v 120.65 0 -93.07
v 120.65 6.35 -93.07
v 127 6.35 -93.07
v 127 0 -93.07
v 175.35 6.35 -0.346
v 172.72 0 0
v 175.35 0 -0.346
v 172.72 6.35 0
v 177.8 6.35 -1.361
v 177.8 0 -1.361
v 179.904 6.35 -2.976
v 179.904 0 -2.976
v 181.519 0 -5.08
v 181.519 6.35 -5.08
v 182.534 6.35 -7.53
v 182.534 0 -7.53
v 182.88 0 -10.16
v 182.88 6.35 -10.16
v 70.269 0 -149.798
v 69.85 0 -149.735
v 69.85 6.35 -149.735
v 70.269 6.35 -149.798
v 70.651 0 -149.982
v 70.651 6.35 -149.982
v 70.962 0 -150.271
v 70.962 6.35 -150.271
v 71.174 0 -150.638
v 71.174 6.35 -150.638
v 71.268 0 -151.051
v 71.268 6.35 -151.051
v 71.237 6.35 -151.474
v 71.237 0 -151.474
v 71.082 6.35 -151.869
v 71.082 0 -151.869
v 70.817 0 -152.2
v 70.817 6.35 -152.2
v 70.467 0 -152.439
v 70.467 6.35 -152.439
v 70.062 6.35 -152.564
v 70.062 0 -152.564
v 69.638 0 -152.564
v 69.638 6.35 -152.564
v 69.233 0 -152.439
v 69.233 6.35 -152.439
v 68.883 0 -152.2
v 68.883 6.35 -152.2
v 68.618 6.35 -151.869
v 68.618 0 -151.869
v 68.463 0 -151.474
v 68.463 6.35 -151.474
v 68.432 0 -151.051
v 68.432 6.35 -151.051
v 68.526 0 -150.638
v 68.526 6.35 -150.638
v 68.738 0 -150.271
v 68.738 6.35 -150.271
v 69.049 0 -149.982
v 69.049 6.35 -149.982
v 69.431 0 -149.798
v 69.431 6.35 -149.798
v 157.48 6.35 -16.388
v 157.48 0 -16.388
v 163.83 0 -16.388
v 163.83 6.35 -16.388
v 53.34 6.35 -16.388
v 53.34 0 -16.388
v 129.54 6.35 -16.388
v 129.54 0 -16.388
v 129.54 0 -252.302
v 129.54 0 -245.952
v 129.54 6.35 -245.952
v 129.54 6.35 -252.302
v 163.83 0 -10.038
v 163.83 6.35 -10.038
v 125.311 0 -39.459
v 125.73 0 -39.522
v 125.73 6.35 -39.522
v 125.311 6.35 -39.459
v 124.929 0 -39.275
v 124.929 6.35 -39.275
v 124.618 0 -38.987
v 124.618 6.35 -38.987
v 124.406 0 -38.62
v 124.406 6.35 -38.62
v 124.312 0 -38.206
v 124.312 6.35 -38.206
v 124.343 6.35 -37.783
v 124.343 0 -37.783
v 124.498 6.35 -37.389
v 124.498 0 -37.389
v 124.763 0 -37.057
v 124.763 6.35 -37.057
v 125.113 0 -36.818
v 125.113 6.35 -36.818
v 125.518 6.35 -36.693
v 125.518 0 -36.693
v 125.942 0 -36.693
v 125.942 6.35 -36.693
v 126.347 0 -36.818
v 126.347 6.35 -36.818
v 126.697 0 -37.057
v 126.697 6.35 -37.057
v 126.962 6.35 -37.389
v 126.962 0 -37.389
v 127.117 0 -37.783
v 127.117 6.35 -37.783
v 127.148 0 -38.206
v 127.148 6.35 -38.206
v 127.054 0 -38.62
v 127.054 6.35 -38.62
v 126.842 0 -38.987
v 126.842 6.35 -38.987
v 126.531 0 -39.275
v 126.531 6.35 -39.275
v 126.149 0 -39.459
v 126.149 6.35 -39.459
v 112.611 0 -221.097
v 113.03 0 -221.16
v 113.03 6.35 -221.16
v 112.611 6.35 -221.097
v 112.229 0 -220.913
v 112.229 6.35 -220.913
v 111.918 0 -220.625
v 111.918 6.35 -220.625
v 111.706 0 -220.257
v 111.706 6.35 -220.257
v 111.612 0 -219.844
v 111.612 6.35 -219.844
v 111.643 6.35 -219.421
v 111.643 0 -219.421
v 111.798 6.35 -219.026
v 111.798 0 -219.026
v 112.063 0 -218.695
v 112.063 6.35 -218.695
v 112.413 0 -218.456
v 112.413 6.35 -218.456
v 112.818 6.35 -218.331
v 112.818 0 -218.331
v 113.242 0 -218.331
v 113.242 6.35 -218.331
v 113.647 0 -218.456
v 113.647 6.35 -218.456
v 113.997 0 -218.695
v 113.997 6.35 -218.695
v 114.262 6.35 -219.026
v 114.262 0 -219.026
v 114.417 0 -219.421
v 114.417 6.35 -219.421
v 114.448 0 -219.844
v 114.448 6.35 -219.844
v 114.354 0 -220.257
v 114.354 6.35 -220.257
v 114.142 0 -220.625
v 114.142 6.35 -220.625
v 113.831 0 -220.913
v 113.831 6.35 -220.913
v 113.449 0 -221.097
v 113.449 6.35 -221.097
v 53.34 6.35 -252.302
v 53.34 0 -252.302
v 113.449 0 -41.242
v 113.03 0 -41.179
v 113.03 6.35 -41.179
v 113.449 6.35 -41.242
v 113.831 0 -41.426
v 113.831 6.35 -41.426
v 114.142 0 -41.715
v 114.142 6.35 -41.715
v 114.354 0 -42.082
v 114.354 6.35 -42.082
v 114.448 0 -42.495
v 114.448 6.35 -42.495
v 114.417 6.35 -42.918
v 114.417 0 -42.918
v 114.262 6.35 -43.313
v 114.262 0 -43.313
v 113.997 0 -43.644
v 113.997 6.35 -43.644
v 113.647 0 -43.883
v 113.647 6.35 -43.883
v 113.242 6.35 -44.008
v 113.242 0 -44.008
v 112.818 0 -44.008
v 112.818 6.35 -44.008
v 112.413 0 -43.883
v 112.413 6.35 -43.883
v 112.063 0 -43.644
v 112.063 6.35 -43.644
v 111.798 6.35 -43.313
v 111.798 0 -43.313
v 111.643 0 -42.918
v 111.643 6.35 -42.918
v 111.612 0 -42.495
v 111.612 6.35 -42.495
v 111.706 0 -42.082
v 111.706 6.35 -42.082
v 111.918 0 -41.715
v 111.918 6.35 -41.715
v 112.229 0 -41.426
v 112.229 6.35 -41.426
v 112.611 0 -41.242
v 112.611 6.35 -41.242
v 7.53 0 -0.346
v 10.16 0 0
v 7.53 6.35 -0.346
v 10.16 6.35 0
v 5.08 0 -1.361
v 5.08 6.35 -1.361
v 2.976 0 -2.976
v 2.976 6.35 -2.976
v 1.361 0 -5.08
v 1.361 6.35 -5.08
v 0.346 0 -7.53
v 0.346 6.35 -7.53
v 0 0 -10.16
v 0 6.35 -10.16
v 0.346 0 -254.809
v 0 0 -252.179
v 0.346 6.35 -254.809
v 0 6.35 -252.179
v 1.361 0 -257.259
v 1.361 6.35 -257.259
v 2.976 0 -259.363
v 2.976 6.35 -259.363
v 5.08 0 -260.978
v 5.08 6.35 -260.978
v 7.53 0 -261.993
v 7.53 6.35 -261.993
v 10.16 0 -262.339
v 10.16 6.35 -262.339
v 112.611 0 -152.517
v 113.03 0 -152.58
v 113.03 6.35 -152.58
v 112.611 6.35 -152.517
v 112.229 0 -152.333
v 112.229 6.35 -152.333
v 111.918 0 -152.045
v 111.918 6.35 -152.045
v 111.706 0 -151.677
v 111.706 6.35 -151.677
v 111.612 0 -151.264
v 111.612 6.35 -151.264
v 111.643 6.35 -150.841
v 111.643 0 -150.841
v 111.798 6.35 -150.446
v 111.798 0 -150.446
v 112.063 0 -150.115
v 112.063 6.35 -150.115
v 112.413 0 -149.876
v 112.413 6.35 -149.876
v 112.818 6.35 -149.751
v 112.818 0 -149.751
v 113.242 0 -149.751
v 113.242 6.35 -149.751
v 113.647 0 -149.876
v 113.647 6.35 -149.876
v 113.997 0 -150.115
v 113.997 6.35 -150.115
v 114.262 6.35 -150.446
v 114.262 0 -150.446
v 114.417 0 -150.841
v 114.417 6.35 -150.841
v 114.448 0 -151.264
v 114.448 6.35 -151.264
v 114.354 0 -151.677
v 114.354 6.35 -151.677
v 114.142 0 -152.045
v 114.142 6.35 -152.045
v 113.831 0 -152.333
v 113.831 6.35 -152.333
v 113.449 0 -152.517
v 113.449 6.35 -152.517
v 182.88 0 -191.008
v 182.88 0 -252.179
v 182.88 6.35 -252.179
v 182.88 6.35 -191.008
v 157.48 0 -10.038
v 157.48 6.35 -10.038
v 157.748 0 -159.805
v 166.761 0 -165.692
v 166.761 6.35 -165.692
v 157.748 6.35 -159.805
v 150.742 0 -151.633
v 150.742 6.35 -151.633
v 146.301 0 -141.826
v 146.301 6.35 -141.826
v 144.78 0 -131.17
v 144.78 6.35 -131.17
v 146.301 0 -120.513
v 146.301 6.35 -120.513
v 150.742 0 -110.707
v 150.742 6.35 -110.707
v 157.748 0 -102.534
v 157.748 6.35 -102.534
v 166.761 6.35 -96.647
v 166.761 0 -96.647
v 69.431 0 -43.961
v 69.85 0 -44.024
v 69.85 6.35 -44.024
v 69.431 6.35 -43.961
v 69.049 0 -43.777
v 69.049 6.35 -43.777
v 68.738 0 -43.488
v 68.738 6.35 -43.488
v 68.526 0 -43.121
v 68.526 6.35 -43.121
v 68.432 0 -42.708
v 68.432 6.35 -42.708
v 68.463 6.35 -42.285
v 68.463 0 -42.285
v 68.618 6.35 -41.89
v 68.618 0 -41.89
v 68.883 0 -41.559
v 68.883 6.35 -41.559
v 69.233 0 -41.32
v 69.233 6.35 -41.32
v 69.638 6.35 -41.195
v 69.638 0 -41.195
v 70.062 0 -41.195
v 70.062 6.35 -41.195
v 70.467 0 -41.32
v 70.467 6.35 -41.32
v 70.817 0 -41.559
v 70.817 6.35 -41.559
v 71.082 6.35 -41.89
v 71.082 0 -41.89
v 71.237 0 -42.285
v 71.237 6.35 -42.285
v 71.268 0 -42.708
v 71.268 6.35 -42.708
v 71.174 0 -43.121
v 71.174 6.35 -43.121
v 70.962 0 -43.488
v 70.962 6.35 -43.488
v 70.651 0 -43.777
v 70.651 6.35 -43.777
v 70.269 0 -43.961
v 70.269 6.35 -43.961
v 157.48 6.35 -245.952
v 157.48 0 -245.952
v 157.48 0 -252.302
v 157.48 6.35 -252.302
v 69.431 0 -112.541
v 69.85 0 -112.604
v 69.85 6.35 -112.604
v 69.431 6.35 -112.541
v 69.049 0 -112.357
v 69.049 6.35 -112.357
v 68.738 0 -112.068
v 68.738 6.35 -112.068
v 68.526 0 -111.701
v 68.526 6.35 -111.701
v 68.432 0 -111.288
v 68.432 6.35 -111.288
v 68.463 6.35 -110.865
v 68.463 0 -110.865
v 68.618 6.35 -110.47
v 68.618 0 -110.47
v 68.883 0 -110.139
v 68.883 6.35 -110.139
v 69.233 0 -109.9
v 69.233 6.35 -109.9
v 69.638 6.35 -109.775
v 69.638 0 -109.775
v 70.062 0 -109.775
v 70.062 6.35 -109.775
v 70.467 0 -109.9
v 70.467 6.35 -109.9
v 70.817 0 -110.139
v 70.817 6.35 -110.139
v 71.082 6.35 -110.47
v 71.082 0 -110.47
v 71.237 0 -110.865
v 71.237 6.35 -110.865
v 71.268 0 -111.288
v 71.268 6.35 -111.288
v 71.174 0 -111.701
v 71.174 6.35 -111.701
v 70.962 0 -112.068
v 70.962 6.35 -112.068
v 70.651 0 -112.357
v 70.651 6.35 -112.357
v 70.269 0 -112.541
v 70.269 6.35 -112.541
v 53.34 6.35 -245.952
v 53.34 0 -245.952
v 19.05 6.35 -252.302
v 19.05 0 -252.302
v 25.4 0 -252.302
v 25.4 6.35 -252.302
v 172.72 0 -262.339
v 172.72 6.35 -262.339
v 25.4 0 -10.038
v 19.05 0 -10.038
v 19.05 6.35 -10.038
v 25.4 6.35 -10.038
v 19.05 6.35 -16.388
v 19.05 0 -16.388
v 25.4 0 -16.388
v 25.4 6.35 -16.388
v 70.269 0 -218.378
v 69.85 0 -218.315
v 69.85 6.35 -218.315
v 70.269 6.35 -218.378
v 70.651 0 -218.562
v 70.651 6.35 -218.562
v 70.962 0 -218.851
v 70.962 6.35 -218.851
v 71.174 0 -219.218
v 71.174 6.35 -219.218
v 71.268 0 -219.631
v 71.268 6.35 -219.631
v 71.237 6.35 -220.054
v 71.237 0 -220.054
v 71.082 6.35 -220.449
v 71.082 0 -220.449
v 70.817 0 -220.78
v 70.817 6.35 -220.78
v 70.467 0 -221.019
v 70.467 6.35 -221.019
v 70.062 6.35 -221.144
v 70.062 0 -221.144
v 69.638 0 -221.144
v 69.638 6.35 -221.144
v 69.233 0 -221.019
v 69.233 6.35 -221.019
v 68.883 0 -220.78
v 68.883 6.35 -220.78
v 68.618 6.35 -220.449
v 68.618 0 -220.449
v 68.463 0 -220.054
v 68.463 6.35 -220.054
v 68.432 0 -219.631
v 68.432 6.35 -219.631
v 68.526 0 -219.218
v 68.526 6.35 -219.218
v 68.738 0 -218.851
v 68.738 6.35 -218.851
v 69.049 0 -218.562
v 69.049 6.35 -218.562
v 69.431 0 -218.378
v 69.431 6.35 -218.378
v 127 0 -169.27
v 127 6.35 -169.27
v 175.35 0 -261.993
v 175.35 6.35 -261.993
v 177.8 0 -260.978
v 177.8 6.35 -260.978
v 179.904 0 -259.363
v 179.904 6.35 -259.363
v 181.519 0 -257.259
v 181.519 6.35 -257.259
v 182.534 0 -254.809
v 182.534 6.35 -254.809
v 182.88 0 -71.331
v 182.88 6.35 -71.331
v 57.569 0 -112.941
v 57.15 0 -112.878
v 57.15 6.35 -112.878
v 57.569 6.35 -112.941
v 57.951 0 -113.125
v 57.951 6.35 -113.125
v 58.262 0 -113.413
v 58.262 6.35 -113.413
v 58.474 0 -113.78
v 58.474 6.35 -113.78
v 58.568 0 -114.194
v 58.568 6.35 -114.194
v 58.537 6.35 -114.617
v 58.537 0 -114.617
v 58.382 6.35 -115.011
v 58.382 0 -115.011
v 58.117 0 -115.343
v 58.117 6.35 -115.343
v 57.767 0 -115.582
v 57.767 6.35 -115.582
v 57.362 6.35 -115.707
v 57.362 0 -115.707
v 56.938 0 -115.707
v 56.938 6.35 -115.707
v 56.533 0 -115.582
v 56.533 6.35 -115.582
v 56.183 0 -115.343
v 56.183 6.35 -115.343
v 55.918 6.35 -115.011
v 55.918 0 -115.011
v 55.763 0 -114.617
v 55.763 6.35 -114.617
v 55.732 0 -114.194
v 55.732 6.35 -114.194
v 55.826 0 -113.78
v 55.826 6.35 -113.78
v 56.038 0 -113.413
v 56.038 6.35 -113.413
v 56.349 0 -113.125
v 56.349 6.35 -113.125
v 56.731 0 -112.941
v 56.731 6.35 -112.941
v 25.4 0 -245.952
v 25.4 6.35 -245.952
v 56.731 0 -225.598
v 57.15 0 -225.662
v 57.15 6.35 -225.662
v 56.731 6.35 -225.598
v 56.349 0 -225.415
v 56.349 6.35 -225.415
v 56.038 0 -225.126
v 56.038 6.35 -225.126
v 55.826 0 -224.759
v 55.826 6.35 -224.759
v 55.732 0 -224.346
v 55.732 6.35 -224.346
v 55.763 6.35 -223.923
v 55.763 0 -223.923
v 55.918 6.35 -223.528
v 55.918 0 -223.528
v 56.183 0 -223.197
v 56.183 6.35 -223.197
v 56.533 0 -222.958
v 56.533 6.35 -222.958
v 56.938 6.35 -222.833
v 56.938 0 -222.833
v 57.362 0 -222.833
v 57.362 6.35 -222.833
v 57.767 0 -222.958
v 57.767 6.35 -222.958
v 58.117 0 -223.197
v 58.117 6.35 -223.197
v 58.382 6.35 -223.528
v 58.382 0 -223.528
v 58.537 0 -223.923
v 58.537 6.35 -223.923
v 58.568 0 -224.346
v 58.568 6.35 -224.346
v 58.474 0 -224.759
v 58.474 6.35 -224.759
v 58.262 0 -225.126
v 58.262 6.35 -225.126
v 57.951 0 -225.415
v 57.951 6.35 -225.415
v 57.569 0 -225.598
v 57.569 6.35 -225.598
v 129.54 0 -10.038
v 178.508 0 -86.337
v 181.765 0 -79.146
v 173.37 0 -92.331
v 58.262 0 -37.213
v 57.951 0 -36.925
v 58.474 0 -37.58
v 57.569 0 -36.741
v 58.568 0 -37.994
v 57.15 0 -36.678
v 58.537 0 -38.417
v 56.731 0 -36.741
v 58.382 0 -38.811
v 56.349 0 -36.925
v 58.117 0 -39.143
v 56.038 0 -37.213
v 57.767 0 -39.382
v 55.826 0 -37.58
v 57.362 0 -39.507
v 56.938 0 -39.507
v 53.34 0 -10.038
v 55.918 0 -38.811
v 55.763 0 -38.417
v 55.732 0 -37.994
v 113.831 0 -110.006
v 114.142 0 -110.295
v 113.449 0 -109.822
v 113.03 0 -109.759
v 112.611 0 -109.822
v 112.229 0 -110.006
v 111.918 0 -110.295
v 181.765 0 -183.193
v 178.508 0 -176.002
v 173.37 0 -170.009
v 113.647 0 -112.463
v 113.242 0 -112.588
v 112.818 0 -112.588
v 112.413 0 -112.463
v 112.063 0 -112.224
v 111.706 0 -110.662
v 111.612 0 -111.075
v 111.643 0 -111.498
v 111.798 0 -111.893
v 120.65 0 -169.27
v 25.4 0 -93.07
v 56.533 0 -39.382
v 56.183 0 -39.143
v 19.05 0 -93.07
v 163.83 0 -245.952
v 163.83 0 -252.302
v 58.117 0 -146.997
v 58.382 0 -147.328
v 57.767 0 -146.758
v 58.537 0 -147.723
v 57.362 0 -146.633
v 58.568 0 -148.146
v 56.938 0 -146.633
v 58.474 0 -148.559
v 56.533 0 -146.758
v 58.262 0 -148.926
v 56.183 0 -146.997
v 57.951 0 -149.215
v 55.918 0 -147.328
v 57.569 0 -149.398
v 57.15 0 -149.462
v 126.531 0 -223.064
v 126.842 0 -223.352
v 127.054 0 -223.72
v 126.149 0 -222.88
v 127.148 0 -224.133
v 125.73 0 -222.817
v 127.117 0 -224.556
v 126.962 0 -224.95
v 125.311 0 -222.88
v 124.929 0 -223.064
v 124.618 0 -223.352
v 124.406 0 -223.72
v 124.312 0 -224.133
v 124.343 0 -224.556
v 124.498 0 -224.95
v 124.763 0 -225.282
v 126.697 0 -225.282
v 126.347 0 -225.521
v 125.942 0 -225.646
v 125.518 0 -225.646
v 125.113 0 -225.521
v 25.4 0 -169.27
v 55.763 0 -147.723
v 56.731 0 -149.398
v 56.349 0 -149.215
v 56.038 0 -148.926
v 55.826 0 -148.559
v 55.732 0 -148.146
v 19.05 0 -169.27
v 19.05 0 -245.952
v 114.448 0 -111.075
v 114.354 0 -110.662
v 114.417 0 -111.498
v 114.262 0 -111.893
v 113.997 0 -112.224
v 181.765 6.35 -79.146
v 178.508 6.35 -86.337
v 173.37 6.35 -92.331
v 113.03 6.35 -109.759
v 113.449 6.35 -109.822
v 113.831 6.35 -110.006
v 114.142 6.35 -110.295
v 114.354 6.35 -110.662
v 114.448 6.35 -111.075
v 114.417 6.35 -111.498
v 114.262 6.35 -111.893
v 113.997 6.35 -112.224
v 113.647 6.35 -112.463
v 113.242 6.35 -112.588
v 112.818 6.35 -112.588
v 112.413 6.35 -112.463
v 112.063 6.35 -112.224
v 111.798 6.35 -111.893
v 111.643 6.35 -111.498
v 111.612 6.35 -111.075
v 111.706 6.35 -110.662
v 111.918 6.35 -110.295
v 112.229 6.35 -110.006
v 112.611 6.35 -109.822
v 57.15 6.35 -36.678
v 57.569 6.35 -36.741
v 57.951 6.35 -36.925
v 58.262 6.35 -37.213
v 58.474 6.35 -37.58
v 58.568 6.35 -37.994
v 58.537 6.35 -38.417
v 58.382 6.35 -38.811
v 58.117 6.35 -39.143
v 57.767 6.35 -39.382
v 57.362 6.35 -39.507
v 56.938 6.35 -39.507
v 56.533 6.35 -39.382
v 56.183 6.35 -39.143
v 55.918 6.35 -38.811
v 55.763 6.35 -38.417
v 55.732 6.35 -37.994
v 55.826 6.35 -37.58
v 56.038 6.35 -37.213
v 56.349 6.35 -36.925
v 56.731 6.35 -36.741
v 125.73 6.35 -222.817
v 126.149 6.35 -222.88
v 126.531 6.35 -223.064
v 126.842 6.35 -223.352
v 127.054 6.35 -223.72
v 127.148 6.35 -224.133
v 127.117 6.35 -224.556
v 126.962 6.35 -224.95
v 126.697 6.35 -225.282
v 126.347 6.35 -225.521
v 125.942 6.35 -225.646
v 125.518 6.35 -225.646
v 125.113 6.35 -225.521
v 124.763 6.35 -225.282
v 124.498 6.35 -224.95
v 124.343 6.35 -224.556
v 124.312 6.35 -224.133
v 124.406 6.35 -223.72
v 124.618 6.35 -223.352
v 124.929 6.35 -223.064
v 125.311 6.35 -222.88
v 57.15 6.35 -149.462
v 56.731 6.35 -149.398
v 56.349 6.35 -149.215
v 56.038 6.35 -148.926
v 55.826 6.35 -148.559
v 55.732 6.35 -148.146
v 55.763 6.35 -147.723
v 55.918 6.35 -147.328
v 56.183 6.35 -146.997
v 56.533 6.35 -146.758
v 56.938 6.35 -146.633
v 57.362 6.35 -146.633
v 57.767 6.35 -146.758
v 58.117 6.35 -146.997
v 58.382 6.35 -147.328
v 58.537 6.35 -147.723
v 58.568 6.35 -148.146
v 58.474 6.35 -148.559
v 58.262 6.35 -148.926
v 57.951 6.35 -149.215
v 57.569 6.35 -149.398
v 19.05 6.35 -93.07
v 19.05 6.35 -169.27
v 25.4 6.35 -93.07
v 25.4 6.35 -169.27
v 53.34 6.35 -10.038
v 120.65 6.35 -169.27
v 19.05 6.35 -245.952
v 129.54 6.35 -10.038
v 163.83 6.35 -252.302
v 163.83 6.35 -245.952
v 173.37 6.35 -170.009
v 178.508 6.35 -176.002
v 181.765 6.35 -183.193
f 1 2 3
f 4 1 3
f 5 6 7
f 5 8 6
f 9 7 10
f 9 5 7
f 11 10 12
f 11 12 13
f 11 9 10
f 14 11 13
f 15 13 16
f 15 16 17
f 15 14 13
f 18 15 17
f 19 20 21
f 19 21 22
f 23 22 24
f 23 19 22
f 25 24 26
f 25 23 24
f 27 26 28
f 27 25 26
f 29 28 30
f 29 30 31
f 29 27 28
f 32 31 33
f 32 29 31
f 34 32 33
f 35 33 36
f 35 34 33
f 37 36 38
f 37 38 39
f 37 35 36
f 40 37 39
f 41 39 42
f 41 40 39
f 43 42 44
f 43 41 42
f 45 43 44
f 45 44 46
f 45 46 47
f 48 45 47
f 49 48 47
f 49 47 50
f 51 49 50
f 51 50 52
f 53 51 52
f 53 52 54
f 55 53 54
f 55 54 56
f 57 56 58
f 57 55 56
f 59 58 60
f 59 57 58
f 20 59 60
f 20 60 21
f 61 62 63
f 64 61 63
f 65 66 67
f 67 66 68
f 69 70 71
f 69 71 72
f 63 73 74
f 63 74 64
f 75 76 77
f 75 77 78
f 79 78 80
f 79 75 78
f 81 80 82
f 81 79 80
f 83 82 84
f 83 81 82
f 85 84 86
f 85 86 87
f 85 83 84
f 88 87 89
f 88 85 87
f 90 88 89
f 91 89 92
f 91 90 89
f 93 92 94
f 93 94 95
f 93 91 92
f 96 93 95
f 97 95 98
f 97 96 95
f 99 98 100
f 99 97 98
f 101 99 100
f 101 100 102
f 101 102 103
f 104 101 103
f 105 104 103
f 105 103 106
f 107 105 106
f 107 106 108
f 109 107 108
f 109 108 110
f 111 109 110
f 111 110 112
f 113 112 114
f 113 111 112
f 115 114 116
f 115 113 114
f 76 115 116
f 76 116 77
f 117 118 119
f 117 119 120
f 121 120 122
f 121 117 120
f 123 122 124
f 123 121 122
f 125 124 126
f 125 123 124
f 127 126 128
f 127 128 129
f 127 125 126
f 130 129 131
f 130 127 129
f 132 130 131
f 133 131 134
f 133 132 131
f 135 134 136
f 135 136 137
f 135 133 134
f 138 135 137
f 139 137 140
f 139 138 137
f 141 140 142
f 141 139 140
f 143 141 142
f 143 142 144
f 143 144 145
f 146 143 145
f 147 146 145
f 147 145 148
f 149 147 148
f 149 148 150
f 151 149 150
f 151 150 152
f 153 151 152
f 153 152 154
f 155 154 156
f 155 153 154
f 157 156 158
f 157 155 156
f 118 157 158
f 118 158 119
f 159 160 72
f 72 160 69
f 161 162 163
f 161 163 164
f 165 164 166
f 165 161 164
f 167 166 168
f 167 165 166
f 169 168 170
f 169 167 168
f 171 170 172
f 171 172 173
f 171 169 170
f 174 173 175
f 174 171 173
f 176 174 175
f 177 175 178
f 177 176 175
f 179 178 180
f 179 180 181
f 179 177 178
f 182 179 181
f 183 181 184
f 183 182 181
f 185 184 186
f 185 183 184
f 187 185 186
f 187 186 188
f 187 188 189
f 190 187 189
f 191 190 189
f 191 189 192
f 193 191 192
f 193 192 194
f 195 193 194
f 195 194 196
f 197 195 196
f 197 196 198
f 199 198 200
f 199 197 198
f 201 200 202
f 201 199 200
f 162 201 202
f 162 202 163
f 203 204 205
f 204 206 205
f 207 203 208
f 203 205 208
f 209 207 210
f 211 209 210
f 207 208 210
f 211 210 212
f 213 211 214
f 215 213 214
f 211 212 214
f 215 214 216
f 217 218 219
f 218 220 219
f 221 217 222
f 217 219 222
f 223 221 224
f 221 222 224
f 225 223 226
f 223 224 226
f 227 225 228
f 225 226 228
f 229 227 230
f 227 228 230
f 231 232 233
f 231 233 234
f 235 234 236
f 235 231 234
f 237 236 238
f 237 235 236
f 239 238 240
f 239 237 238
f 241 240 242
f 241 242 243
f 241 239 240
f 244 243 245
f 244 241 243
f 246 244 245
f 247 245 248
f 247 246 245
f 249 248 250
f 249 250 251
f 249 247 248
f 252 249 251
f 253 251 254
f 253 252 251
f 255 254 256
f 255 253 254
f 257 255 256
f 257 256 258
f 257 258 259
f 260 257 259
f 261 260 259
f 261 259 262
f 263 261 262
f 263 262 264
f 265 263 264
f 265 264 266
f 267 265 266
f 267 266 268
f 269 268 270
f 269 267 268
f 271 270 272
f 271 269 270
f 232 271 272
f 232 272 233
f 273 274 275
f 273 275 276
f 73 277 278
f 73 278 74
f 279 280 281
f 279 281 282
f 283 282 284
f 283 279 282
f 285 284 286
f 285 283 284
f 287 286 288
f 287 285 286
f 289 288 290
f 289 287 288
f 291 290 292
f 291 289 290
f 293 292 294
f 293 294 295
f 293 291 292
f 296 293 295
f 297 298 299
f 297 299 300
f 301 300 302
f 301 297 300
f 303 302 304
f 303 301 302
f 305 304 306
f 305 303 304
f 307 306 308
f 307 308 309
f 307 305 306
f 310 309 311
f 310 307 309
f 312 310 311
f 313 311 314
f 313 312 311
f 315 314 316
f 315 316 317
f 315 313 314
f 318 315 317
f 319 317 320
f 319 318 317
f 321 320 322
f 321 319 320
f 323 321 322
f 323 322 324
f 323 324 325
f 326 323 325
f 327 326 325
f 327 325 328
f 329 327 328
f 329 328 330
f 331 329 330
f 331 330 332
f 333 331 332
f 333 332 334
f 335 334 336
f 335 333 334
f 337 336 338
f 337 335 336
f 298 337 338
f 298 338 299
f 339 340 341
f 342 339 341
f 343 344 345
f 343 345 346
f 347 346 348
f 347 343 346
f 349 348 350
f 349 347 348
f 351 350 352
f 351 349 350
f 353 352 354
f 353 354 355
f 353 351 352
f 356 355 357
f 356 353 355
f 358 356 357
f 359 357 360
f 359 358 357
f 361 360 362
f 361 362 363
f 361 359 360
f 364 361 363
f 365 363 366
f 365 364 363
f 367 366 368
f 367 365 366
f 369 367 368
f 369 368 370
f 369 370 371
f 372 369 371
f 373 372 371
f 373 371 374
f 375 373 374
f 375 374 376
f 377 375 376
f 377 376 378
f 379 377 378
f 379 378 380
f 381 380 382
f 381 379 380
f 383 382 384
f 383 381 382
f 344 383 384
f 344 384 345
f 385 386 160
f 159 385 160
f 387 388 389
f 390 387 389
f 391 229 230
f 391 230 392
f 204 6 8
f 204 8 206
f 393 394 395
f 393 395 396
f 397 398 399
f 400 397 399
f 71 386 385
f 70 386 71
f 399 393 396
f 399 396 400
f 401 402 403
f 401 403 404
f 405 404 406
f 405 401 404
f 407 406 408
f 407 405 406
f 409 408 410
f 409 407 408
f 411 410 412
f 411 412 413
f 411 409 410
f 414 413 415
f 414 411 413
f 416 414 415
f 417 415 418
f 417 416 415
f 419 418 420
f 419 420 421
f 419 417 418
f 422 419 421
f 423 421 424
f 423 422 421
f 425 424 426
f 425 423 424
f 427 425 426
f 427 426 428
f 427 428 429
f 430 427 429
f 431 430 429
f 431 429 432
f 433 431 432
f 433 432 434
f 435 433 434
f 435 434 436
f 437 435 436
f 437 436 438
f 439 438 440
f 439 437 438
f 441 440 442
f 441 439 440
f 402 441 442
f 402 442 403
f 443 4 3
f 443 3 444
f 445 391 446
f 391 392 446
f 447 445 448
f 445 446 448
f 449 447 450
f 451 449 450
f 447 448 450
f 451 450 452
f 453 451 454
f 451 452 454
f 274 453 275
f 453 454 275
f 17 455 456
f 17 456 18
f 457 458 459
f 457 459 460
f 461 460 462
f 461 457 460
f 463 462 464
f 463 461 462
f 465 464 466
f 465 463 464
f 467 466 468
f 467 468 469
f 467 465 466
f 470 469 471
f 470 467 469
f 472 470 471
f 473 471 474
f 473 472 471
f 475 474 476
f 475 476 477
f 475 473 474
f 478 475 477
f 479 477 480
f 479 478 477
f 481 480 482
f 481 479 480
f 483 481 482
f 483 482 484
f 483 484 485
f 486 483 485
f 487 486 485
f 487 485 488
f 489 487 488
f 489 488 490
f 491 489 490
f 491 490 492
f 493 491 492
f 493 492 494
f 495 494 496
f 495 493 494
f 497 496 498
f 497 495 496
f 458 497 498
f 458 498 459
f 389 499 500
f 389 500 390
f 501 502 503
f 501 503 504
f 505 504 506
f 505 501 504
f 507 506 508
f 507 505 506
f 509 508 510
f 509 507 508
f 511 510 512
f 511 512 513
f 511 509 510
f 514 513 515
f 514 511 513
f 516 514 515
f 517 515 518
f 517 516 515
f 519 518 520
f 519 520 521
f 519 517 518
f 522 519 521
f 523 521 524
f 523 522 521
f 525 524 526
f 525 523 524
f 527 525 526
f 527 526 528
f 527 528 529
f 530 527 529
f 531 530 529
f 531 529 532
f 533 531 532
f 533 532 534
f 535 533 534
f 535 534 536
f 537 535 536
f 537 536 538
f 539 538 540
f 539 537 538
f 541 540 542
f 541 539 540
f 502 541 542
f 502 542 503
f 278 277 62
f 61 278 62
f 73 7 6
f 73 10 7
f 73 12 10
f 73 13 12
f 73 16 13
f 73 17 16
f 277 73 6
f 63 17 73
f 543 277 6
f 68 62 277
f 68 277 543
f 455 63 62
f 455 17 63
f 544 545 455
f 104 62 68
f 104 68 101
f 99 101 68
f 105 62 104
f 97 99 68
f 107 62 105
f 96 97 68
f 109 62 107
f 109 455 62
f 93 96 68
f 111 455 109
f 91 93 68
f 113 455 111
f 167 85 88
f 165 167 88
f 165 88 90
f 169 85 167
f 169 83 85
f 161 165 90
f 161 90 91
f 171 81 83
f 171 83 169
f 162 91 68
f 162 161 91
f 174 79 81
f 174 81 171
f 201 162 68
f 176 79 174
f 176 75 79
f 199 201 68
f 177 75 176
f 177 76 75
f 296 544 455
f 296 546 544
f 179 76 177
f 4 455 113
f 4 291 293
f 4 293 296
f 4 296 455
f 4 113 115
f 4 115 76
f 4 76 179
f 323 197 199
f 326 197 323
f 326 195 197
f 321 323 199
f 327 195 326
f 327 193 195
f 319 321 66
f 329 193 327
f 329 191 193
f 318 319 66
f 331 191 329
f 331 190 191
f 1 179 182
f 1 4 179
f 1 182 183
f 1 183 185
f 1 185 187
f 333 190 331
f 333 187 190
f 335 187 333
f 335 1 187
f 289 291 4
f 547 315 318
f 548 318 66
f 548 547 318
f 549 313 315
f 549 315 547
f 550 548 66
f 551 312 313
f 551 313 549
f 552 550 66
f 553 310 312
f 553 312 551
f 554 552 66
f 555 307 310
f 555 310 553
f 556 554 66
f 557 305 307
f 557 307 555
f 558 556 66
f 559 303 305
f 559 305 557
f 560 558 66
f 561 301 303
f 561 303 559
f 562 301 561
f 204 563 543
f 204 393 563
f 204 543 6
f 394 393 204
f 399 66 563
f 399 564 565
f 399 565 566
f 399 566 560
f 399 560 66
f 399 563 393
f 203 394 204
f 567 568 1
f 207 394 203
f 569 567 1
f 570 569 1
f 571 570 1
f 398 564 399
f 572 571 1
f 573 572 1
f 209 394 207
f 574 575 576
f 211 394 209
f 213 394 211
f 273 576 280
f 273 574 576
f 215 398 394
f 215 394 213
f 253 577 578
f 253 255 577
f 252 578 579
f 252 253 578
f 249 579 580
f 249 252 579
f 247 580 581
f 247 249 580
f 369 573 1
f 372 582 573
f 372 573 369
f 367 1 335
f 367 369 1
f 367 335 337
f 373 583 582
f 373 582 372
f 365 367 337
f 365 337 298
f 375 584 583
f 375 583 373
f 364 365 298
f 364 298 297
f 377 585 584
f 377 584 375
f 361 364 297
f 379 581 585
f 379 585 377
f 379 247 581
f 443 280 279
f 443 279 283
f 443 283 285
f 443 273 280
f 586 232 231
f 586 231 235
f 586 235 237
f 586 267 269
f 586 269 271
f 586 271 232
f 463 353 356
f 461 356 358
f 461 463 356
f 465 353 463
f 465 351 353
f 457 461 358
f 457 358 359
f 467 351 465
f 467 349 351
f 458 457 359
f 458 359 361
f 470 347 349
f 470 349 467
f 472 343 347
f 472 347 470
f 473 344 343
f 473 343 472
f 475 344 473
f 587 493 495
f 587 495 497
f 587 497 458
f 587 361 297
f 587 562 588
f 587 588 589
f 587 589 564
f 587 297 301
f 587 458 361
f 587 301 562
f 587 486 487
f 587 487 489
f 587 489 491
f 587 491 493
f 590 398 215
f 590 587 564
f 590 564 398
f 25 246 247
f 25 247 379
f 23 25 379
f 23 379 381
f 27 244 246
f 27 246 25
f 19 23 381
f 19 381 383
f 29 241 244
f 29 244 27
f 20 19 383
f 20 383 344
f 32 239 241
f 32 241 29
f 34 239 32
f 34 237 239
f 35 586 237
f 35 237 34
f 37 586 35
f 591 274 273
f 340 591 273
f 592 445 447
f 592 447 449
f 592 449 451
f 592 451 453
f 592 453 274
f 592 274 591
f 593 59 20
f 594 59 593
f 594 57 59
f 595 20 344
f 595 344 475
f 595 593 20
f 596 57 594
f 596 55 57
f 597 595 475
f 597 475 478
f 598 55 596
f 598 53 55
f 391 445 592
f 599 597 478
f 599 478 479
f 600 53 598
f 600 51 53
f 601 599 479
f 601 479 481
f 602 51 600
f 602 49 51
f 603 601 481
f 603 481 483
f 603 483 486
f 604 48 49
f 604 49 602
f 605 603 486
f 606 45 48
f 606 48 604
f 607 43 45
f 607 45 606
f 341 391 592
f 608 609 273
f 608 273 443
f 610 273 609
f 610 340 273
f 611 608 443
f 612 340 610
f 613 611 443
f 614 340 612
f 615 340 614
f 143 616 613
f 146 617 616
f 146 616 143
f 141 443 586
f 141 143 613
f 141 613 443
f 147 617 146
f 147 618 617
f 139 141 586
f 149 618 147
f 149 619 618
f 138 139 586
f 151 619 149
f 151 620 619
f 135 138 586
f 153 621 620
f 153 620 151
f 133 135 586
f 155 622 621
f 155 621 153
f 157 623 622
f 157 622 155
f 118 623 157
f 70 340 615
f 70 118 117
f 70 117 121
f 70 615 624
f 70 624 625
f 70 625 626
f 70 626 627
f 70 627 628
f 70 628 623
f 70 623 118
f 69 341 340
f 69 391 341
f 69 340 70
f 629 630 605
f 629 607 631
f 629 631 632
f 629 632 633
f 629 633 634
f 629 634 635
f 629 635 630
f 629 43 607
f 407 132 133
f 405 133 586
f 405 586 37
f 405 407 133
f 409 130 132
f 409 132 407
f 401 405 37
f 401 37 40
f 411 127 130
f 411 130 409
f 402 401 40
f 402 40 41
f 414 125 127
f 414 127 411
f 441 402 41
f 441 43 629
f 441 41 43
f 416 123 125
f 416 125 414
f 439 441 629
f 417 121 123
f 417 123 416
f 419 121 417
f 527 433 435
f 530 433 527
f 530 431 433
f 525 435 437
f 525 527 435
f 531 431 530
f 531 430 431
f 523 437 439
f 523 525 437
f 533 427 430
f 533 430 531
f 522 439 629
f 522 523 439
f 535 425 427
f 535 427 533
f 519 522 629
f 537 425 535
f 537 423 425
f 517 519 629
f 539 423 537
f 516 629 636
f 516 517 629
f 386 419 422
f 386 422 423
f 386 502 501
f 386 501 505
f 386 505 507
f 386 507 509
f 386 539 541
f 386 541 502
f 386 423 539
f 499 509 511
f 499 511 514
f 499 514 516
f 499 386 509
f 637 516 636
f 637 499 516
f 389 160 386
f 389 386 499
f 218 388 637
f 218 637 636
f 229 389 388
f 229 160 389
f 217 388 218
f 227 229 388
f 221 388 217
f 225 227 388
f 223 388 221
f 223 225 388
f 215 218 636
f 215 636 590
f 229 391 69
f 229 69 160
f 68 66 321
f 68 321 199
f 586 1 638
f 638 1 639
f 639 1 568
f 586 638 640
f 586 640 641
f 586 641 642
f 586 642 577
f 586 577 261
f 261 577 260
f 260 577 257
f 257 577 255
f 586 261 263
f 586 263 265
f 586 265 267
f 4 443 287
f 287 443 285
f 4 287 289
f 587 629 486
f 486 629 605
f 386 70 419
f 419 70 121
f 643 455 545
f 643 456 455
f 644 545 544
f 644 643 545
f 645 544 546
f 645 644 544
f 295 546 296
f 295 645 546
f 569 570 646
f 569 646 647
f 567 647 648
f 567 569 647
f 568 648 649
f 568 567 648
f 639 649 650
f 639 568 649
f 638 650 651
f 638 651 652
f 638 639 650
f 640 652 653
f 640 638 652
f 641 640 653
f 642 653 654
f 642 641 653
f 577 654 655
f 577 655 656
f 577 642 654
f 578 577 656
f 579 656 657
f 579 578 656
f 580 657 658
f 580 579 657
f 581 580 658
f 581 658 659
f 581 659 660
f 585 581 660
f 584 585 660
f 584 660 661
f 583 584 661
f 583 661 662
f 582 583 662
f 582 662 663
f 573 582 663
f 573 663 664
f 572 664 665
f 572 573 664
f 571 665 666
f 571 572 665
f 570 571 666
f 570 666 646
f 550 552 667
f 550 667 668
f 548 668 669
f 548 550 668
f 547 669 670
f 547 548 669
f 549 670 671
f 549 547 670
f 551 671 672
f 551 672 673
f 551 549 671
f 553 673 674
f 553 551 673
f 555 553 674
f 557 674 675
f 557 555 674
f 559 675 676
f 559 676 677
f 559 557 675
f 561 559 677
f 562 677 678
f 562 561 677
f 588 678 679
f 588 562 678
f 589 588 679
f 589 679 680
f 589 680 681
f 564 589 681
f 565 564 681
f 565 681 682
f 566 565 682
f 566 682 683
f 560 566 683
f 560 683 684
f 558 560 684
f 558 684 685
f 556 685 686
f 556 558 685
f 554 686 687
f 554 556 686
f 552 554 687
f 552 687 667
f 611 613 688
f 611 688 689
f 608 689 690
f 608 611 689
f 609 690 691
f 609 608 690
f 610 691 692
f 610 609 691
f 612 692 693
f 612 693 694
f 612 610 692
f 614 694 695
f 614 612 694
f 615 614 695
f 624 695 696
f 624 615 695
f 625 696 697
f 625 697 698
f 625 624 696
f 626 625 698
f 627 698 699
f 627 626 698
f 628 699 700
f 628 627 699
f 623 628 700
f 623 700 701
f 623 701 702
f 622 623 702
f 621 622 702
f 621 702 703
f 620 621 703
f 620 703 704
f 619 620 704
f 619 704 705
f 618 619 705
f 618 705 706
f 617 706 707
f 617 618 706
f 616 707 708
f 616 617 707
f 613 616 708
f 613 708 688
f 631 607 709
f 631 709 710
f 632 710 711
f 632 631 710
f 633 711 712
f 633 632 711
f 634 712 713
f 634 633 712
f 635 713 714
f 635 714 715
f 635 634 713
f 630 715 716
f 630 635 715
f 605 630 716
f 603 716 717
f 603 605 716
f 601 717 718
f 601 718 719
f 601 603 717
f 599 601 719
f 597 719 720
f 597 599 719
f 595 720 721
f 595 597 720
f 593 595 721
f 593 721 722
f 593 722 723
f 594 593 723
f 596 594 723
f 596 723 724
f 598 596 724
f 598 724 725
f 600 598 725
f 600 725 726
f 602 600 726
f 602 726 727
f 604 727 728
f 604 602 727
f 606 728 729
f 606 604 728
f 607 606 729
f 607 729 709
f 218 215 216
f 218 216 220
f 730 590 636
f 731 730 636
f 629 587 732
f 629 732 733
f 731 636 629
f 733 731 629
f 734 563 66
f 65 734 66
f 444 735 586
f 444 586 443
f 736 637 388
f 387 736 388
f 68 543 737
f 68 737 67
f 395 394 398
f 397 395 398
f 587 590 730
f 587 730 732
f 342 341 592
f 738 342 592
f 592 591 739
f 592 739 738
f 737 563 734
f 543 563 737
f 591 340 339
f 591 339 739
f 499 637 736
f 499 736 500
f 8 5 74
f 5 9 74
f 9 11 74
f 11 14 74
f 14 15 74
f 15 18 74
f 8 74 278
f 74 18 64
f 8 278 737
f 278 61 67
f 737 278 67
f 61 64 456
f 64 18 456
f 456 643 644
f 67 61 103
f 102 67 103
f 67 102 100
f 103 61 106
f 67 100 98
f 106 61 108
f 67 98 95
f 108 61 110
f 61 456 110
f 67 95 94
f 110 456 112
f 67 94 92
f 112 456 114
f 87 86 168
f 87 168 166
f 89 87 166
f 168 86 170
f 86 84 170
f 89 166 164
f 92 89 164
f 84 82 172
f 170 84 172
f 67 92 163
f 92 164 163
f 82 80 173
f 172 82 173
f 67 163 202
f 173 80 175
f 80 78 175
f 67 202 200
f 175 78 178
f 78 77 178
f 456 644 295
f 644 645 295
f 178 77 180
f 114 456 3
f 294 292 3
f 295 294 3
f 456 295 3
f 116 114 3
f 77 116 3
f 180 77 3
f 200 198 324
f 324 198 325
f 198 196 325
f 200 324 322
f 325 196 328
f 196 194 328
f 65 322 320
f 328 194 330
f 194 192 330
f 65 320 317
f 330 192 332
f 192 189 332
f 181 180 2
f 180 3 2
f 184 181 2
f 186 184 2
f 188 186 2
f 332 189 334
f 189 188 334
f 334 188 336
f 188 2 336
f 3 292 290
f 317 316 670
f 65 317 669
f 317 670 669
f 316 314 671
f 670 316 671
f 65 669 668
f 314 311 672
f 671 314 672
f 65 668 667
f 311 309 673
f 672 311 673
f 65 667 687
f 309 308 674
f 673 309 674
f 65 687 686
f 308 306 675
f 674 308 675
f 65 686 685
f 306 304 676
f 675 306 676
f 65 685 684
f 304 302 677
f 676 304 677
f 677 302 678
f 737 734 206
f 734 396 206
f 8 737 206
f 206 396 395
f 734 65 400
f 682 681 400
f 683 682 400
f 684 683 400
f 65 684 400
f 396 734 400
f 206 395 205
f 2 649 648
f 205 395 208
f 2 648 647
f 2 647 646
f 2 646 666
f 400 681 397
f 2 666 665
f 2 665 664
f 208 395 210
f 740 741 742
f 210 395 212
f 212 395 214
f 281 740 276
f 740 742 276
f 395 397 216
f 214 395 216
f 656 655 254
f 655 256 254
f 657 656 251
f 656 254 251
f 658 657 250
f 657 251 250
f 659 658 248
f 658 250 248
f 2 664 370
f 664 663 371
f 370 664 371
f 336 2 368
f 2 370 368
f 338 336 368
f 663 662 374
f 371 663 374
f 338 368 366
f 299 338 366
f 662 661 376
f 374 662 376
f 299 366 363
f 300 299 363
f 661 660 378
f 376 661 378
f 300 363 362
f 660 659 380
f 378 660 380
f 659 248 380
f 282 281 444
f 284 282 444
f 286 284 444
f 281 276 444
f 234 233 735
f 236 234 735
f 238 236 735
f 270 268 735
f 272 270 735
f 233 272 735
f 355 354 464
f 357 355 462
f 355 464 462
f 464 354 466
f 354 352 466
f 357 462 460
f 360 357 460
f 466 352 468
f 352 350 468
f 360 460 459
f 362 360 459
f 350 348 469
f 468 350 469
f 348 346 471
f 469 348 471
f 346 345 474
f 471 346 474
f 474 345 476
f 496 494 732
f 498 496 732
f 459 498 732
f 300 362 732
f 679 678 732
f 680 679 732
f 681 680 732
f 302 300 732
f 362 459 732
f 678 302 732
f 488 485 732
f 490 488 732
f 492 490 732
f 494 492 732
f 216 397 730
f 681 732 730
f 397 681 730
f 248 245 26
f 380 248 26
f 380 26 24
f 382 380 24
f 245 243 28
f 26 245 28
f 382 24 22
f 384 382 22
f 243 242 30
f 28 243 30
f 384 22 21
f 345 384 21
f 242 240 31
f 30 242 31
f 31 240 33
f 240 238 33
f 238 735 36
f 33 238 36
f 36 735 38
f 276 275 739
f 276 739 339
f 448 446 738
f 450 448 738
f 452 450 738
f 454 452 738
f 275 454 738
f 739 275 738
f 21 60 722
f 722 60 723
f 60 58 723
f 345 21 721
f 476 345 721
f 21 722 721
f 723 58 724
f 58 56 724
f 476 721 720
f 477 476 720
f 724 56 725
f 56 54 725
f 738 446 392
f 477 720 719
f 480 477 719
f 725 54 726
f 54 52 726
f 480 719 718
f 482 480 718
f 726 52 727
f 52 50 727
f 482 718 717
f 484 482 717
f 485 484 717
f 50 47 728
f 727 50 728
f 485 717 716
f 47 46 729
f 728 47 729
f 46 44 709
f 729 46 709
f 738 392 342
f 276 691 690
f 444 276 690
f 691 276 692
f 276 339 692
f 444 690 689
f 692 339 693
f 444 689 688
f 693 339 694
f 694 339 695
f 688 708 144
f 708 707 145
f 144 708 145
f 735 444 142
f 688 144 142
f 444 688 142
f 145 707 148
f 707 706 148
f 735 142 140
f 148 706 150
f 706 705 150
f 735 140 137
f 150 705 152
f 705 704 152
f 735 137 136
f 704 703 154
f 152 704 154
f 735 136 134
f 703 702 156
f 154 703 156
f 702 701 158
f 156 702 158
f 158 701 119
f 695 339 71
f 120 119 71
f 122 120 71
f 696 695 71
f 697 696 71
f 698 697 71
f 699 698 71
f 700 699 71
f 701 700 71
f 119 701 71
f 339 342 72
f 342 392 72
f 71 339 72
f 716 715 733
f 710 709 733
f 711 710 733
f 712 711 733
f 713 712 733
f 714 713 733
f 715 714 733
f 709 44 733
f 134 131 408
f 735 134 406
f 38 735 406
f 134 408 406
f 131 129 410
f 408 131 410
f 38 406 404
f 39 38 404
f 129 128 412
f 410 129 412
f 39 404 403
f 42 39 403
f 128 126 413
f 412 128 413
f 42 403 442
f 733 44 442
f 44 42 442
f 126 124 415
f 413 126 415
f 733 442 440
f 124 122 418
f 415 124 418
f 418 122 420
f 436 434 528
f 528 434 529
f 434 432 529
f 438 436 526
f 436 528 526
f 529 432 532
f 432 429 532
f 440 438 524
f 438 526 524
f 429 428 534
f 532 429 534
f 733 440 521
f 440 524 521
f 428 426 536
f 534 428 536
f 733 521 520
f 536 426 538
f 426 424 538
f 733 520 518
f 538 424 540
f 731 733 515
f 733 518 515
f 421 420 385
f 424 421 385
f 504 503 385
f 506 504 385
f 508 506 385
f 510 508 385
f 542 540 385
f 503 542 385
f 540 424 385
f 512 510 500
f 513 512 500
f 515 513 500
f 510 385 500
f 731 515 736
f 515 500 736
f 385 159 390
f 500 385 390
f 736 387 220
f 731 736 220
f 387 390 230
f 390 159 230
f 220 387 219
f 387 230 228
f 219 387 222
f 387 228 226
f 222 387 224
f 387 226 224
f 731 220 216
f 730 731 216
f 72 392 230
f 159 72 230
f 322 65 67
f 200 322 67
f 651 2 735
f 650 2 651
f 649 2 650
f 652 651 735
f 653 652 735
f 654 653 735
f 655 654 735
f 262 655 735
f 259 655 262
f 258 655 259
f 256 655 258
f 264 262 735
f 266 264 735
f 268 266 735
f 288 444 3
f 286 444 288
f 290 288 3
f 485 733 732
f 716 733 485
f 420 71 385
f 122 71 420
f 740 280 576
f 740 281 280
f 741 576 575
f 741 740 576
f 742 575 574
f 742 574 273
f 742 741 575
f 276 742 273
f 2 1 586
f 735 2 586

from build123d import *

# Parameters (mm, degrees)
SKETCH3_R           = 1.4224
SKETCH3_W           = 6.35
SKETCH3_H           = 6.35
SKETCH3_W_2         = 76.2
SKETCH3_H_2         = 76.2
BOSS_EXTRUDE1_DEPTH = 6.35
FILLET1_R           = 10.16
FILLET2_R           = 27.94


with BuildPart() as part:
    # Sketch3 → Boss-Extrude1 (new body)
    with BuildSketch(Plane(origin=(0, 0, 0), x_dir=(1, 0, 0), z_dir=(0, 1, 0))):
        with BuildLine():
            Line((182.88, 0), (0, 0))
            Line((0, 0), (0, 262.339276313))
            Line((0, 262.339276313), (182.88, 262.339276313))
            Line((182.88, 262.339276313), (182.88, 169.269638157))
            ThreePointArc((182.88, 169.269638157), (144.78, 131.169638157), (182.88, 93.069638157))
            Line((182.88, 93.069638157), (182.88, 0))
        make_face()
        with Locations(Location((57.15, 38.1, 0), (0, 0, 270))):
            Circle(SKETCH3_R, mode=Mode.SUBTRACT)
        with Locations(Location((57.15, 114.3, 0), (0, 0, 270))):
            Circle(SKETCH3_R, mode=Mode.SUBTRACT)
        with Locations(Location((125.73, 38.1, 0), (0, 0, 90))):
            Circle(SKETCH3_R, mode=Mode.SUBTRACT)
        with Locations(Location((69.85, 151.157668748, 0), (0, 0, 270))):
            Circle(SKETCH3_R, mode=Mode.SUBTRACT)
        with Locations(Location((69.85, 219.737668748, 0), (0, 0, 270))):
            Circle(SKETCH3_R, mode=Mode.SUBTRACT)
        with Locations(Location((113.03, 151.157668748, 0), (0, 0, 90))):
            Circle(SKETCH3_R, mode=Mode.SUBTRACT)
        with Locations(Location((113.03, 219.737668748, 0), (0, 0, 90))):
            Circle(SKETCH3_R, mode=Mode.SUBTRACT)
        with Locations(Location((113.03, 42.601607565, 0), (0, 0, 270))):
            Circle(SKETCH3_R, mode=Mode.SUBTRACT)
        with Locations(Location((113.03, 111.181607565, 0), (0, 0, 270))):
            Circle(SKETCH3_R, mode=Mode.SUBTRACT)
        with Locations(Location((69.85, 111.181607565, 0), (0, 0, 90))):
            Circle(SKETCH3_R, mode=Mode.SUBTRACT)
        with Locations(Location((69.85, 42.601607565, 0), (0, 0, 90))):
            Circle(SKETCH3_R, mode=Mode.SUBTRACT)
        with Locations(Location((125.73, 224.239276313, 0), (0, 0, 270))):
            Circle(SKETCH3_R, mode=Mode.SUBTRACT)
        with Locations(Location((57.15, 224.239276313, 0), (0, 0, 90))):
            Circle(SKETCH3_R, mode=Mode.SUBTRACT)
        with Locations(Location((57.15, 148.039276313, 0), (0, 0, 90))):
            Circle(SKETCH3_R, mode=Mode.SUBTRACT)
        with Locations((22.225, 13.212735966)):
            Rectangle(SKETCH3_W, SKETCH3_H, mode=Mode.SUBTRACT)
        with Locations((160.655, 13.212735966)):
            Rectangle(SKETCH3_W, SKETCH3_H, mode=Mode.SUBTRACT)
        with Locations((160.655, 249.126540348)):
            Rectangle(SKETCH3_W, SKETCH3_H, mode=Mode.SUBTRACT)
        with Locations((22.225, 249.126540348)):
            Rectangle(SKETCH3_W, SKETCH3_H, mode=Mode.SUBTRACT)
        with Locations((91.44, 249.126540348)):
            Rectangle(SKETCH3_W_2, SKETCH3_H, mode=Mode.SUBTRACT)
        with Locations((91.44, 13.212735966)):
            Rectangle(SKETCH3_W_2, SKETCH3_H, mode=Mode.SUBTRACT)
        with Locations((123.825, 131.169638157)):
            Rectangle(SKETCH3_W, SKETCH3_H_2, mode=Mode.SUBTRACT)
        with Locations((22.225, 131.169638157)):
            Rectangle(SKETCH3_W, SKETCH3_H_2, mode=Mode.SUBTRACT)
    extrude(amount=BOSS_EXTRUDE1_DEPTH)

    # Fillet1
    fillet1_edges = [part.edges().sort_by_distance(p)[0] for p in [
        (0, 3.175, -262.339276313),
        (182.88, 3.175, -262.339276313),
        (182.88, 3.175, 0),
        (0, 3.175, 0),
    ]]
    fillet(fillet1_edges, radius=FILLET1_R)

    # Fillet2
    fillet2_edges = [part.edges().sort_by_distance(p)[0] for p in [
        (182.88, 3.175, -169.269638157),
        (182.88, 3.175, -93.069638157),
    ]]
    fillet(fillet2_edges, radius=FILLET2_R)


solid = part.part
